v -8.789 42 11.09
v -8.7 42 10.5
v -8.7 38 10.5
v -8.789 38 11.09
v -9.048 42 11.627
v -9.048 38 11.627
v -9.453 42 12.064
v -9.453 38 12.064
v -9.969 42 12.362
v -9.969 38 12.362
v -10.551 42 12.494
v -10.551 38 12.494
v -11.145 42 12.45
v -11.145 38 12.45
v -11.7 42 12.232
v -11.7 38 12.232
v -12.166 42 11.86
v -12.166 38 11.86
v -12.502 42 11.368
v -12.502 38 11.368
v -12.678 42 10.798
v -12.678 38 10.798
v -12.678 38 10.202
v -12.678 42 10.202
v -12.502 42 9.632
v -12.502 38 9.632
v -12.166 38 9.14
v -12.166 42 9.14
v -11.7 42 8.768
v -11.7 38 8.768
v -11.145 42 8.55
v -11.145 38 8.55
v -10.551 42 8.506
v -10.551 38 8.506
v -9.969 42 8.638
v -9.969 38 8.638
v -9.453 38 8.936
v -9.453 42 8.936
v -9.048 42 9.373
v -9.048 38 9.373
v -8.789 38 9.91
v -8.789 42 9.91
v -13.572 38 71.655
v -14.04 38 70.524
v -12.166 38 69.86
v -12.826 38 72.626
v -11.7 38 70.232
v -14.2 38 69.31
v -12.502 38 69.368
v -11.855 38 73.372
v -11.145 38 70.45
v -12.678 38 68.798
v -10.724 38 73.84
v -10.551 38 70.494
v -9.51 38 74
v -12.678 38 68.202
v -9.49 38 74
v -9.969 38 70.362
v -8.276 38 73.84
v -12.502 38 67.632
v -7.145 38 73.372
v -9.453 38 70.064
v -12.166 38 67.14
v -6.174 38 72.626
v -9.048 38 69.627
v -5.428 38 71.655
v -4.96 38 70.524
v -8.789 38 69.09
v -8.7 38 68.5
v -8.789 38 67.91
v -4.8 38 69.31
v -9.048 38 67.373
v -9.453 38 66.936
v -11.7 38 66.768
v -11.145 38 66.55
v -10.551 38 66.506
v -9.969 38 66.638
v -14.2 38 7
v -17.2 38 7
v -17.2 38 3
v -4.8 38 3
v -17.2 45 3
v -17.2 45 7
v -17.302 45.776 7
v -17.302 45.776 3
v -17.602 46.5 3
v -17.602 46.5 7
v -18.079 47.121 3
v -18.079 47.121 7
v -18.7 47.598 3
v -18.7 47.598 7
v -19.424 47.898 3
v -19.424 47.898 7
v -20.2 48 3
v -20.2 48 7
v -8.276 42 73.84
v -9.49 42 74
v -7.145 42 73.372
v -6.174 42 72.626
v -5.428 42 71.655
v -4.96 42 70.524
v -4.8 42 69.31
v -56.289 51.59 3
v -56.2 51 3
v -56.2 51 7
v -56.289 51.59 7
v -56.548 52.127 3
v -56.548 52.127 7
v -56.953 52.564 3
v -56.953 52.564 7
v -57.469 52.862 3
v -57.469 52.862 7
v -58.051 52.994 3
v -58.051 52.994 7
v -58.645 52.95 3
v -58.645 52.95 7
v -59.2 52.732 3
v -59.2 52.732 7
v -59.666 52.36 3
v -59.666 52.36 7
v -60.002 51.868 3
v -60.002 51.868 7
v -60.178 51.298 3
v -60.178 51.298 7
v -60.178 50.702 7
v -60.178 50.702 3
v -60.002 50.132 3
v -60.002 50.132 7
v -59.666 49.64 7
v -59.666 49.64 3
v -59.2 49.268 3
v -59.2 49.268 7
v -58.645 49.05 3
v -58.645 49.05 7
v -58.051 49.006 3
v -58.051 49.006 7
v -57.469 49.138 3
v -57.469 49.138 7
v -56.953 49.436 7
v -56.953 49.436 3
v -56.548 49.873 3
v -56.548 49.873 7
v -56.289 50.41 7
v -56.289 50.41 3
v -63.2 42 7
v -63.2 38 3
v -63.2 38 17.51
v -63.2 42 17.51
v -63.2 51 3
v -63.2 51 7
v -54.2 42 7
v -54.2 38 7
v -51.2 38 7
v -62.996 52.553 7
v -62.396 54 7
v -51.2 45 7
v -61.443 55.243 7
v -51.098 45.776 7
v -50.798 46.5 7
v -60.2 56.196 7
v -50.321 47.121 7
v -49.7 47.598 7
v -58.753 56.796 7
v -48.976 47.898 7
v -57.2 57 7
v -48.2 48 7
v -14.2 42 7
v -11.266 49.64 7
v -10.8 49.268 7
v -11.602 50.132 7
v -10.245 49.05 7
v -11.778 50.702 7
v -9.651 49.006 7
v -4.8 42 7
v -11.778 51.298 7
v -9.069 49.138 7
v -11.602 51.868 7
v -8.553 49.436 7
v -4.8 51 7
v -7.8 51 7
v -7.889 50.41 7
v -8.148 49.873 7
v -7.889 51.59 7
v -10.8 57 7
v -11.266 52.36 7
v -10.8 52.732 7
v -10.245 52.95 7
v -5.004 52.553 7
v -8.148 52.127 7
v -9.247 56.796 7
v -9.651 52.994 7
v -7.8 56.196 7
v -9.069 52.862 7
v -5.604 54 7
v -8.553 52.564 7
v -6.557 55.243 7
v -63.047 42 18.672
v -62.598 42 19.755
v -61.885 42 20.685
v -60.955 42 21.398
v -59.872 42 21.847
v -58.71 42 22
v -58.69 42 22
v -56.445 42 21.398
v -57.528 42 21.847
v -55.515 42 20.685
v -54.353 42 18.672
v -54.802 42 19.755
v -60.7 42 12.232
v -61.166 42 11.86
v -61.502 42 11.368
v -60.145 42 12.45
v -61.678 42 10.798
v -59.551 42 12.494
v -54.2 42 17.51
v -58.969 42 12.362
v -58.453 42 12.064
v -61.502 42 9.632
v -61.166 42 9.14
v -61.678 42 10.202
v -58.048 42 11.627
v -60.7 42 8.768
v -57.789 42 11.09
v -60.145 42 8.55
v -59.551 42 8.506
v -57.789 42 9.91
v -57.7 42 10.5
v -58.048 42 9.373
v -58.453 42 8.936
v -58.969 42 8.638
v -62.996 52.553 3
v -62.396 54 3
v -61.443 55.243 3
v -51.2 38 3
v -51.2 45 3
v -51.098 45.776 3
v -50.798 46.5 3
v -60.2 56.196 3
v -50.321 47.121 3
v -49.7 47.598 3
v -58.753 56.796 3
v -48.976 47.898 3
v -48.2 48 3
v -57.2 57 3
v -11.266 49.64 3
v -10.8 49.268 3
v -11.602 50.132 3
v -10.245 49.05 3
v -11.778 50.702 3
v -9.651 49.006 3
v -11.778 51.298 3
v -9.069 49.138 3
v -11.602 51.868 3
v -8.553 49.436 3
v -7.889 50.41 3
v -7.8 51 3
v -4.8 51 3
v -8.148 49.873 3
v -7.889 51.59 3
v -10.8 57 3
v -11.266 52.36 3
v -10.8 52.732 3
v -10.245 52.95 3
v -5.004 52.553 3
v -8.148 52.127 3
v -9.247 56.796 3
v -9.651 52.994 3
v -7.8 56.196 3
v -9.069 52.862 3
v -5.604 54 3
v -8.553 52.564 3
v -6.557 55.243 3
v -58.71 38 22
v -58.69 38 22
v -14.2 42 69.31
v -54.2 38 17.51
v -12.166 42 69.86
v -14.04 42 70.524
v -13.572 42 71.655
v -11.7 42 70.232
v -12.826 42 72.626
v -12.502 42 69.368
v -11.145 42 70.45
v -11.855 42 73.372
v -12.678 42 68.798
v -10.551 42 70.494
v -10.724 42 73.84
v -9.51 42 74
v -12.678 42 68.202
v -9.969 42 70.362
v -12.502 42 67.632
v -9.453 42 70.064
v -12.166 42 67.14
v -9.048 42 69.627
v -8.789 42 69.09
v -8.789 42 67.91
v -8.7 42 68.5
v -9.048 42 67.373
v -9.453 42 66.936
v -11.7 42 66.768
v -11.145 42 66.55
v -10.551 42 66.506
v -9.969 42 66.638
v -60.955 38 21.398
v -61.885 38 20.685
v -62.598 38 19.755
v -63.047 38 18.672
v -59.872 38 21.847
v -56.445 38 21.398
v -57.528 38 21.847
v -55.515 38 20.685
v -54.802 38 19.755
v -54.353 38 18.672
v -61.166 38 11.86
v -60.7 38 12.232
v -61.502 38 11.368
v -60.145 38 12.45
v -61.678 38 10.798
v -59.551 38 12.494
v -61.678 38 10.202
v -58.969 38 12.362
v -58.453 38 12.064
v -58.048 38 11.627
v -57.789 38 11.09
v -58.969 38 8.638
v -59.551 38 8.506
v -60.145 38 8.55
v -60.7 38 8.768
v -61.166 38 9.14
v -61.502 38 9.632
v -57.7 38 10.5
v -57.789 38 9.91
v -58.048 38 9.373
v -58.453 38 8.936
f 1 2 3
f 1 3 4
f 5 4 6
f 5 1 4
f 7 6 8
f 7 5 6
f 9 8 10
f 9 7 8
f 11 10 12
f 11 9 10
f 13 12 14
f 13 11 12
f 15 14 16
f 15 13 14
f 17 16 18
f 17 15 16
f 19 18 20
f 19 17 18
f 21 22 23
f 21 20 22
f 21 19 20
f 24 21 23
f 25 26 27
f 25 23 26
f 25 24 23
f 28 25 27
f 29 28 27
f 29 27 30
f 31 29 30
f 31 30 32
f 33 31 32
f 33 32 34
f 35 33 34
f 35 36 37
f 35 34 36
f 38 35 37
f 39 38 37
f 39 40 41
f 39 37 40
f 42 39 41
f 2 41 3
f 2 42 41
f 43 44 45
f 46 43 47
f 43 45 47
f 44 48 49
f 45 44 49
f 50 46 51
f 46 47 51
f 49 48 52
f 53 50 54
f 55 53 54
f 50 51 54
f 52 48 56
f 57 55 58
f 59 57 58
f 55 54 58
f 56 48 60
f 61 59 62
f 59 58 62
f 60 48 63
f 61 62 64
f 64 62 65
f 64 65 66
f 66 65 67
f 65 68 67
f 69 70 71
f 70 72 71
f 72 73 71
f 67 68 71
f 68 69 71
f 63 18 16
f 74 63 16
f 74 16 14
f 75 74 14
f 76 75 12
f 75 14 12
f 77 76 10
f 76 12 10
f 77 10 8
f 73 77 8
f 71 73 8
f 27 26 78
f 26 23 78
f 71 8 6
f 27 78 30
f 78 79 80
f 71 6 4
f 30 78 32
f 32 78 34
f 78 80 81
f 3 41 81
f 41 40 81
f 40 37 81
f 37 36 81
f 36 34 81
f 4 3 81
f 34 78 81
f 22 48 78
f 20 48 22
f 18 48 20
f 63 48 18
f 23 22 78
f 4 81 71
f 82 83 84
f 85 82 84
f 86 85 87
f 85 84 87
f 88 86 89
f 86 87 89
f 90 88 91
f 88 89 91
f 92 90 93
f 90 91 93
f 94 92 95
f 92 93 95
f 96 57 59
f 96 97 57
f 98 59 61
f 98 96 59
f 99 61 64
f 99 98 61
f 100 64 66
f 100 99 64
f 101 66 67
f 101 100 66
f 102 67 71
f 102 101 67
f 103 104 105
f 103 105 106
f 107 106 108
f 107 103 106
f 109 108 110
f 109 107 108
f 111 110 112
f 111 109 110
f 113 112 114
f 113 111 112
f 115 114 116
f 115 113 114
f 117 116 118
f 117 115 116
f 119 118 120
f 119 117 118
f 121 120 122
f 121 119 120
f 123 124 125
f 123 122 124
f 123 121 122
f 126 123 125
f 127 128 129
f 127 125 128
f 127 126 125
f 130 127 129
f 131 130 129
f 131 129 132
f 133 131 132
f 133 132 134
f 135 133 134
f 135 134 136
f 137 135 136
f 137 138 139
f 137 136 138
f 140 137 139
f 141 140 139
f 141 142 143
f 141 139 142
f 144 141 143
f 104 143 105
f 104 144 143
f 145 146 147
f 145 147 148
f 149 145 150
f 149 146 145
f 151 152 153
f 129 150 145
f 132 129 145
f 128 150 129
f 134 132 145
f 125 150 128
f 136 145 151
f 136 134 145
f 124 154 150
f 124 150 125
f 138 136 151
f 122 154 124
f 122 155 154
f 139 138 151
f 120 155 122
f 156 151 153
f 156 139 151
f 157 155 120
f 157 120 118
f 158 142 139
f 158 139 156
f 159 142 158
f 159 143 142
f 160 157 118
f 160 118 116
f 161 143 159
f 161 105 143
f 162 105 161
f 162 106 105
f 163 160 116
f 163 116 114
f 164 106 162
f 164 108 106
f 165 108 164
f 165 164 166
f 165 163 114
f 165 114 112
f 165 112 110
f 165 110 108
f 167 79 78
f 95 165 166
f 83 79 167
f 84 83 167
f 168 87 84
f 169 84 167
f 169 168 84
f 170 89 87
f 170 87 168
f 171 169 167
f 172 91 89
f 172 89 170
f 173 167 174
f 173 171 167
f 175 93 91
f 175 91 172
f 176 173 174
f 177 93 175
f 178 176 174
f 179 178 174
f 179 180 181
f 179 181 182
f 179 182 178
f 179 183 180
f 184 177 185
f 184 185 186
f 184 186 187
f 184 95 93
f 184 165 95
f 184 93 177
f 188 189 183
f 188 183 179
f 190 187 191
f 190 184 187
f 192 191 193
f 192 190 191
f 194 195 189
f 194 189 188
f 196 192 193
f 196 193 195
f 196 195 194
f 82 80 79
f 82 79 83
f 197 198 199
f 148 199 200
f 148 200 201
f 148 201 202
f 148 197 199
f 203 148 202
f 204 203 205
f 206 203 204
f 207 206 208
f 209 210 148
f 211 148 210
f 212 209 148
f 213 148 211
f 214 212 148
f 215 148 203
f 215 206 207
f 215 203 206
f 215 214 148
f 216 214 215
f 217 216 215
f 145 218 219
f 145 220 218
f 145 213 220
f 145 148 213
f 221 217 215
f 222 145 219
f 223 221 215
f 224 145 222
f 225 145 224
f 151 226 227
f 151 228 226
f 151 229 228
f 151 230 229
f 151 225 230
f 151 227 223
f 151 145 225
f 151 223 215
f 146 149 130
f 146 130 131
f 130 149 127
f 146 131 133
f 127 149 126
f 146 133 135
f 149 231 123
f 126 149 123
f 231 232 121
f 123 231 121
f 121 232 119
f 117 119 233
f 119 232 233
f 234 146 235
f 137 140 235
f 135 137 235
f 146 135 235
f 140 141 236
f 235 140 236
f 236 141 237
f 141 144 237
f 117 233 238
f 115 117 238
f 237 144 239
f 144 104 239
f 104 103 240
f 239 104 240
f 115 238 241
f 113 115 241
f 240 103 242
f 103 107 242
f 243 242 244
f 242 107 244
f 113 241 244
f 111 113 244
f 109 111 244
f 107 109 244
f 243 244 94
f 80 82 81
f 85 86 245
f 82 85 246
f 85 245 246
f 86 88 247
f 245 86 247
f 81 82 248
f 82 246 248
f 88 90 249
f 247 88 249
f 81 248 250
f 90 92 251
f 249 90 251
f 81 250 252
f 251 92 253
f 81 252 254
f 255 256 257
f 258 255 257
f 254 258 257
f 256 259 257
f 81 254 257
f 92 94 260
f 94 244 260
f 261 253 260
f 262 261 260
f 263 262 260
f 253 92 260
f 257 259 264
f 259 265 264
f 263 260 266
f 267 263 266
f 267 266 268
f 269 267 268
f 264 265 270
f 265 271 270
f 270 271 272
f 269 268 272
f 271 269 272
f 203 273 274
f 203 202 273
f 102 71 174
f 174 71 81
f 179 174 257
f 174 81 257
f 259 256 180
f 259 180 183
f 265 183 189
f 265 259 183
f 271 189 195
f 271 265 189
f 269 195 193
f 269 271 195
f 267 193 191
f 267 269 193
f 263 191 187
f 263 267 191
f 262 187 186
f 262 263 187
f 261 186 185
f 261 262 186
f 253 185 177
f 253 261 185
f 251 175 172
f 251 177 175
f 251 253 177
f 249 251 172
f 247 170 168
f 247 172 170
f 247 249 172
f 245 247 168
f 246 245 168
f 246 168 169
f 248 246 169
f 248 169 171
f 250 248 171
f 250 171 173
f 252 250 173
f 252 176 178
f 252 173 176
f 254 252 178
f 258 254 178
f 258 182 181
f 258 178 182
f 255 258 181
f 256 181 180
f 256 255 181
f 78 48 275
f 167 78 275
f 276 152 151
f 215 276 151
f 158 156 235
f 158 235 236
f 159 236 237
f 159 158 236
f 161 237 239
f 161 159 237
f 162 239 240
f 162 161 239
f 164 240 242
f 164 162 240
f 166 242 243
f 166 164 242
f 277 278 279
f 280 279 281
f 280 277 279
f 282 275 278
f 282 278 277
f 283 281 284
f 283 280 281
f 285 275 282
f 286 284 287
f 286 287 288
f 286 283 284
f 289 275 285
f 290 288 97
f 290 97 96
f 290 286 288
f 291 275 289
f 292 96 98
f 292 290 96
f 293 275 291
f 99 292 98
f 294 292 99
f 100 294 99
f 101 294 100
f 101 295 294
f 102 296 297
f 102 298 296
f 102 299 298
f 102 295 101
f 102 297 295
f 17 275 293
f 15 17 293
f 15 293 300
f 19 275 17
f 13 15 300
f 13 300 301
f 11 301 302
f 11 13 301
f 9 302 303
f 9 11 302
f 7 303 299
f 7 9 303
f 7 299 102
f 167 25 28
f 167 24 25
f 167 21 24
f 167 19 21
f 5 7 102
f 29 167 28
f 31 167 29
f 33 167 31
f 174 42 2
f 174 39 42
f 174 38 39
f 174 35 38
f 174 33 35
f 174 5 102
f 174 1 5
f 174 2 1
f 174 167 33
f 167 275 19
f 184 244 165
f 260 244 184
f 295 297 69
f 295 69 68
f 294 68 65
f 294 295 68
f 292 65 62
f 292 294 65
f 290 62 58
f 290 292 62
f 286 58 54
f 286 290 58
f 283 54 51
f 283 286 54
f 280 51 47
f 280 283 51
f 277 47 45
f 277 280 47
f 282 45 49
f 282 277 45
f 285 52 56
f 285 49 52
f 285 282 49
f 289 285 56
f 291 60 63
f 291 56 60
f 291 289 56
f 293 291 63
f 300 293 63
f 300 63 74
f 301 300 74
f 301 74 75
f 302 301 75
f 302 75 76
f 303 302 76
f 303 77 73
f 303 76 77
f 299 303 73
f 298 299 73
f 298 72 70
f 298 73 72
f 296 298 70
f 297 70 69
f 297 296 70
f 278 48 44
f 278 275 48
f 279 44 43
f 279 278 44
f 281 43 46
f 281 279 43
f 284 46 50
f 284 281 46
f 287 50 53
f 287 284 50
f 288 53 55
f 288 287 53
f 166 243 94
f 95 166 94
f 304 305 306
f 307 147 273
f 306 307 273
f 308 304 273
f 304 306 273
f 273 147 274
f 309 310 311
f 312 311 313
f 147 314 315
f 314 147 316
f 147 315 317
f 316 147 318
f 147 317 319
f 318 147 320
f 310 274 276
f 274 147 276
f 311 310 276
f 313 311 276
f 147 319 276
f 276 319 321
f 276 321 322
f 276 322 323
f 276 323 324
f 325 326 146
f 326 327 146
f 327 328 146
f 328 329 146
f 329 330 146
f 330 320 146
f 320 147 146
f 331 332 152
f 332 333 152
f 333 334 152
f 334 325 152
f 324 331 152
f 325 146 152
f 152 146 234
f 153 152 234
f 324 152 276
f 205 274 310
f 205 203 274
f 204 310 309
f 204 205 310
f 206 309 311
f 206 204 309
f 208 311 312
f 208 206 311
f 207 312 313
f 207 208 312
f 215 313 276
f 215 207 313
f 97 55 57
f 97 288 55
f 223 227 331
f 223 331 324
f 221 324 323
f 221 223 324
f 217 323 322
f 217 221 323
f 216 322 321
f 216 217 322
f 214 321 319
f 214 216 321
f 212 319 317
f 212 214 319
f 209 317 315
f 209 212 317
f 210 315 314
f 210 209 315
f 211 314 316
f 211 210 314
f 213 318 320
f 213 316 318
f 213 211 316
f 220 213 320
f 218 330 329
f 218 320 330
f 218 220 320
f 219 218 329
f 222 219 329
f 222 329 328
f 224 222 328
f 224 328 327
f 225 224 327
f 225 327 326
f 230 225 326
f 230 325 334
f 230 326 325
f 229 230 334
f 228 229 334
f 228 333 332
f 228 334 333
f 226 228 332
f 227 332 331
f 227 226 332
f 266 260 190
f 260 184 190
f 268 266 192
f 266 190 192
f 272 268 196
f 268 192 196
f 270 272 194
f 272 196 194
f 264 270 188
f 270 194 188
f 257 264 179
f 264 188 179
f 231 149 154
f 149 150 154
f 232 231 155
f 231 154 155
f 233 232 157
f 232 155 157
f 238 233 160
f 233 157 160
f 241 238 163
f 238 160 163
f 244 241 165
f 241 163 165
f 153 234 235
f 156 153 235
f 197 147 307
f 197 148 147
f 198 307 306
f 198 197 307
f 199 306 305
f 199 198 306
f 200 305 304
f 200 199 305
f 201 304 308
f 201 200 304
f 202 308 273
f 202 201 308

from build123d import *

# Parameters (mm, degrees)
CYLINDER393_R     = 2
CYLINDER393_DEPTH = 16
CYLINDER395_R     = 2
CYLINDER395_DEPTH = 16
CYLINDER394_R     = 2
CYLINDER394_DEPTH = 16
BOX490_W          = 34
BOX490_H          = 10
BOX490_DEPTH      = 7
FILLET028_R       = 3
BOX489_W          = 58.4
BOX489_H          = 19
BOX489_DEPTH      = 4
FILLET029_R       = 6
CYLINDER384_R     = 2
CYLINDER384_DEPTH = 10
CYLINDER385_R     = 2
CYLINDER385_DEPTH = 10
BOX482_W          = 9.4
BOX482_H          = 4
BOX482_DEPTH      = 67
FILLET025_R       = 4.69
CYLINDER386_R     = 2
CYLINDER386_DEPTH = 10
BOX480_W          = 9
BOX480_H          = 4
BOX480_DEPTH      = 15
FILLET024_R       = 4.49


with BuildPart() as cylinder393:
    # Cylinder393 → Cylinder393 (new body)
    with BuildSketch(Plane(origin=(-9.8, 51, -5), x_dir=(1, 0, 0), z_dir=(0, 0, 1))):
        Circle(CYLINDER393_R)
    extrude(amount=CYLINDER393_DEPTH)


with BuildPart() as cylinder395:
    # Cylinder395 → Cylinder395 (new body)
    with BuildSketch(Plane(origin=(-58.2, 51, -5), x_dir=(1, 0, 0), z_dir=(0, 0, 1))):
        Circle(CYLINDER395_R)
    extrude(amount=CYLINDER395_DEPTH)


with BuildPart() as fusion386:
    # Cylinder394 → Cylinder394 (new body)
    with BuildSketch(Plane(origin=(-9.8, 51, -5), x_dir=(1, 0, 0), z_dir=(0, 0, 1))):
        Circle(CYLINDER394_R)
    extrude(amount=CYLINDER394_DEPTH)

    # Fusion386: union Cylinder393, Cylinder395
    add(cylinder393.part)
    add(cylinder395.part)


with BuildPart() as fillet028:
    # Box490 → Box490 (new body)
    with BuildSketch(Plane(origin=(-51.2, 38, 0), x_dir=(1, 0, 0), z_dir=(0, 0, 1))):
        with Locations((17, 5)):
            Rectangle(BOX490_W, BOX490_H)
    extrude(amount=BOX490_DEPTH)

    # Fillet028
    fillet028_edges = [fillet028.edges().sort_by_distance(p)[0] for p in [
        (-51.2, 48, 3.5),
        (-17.2, 48, 3.5),
    ]]
    fillet(fillet028_edges, radius=FILLET028_R)


with BuildPart() as fillet029:
    # Box489 → Box489 (new body)
    with BuildSketch(Plane(origin=(-63.2, 38, 3), x_dir=(1, 0, 0), z_dir=(0, 0, 1))):
        with Locations((29.2, 9.5)):
            Rectangle(BOX489_W, BOX489_H)
    extrude(amount=BOX489_DEPTH)

    # Cut421: cut Fillet028
    add(fillet028.part, mode=Mode.SUBTRACT)

    # Cut422: cut Fusion386
    add(fusion386.part, mode=Mode.SUBTRACT)

    # Fillet029
    fillet029_edges = [fillet029.edges().sort_by_distance(p)[0] for p in [
        (-63.2, 57, 5),
        (-4.8, 57, 5),
    ]]
    fillet(fillet029_edges, radius=FILLET029_R)


with BuildPart() as cylinder384:
    # Cylinder384 → Cylinder384 (new body)
    with BuildSketch(Plane(origin=(-10.7, 44, 10.5), x_dir=(1, 0, 0), z_dir=(0, -1, 0))):
        Circle(CYLINDER384_R)
    extrude(amount=CYLINDER384_DEPTH)


with BuildPart() as fusion379:
    # Cylinder385 → Cylinder385 (new body)
    with BuildSketch(Plane(origin=(-10.7, 44, 68.5), x_dir=(1, 0, 0), z_dir=(0, -1, 0))):
        Circle(CYLINDER385_R)
    extrude(amount=CYLINDER385_DEPTH)

    # Fusion379: union Cylinder384
    add(cylinder384.part)


with BuildPart() as fillet025:
    # Box482 → Box482 (new body)
    with BuildSketch(Plane(origin=(-14.2, 38, 7), x_dir=(1, 0, 0), z_dir=(0, 0, 1))):
        with Locations((4.7, 2)):
            Rectangle(BOX482_W, BOX482_H)
    extrude(amount=BOX482_DEPTH)

    # Cut417: cut Fusion379
    add(fusion379.part, mode=Mode.SUBTRACT)

    # Fillet025
    fillet025_edges = [fillet025.edges().sort_by_distance(p)[0] for p in [
        (-14.2, 40, 74),
        (-4.8, 40, 74),
    ]]
    fillet(fillet025_edges, radius=FILLET025_R)


with BuildPart() as cylinder386:
    # Cylinder386 → Cylinder386 (new body)
    with BuildSketch(Plane(origin=(-59.7, 44, 10.5), x_dir=(1, 0, 0), z_dir=(0, -1, 0))):
        Circle(CYLINDER386_R)
    extrude(amount=CYLINDER386_DEPTH)


with BuildPart() as fusion388:
    # Box480 → Box480 (new body)
    with BuildSketch(Plane(origin=(-63.2, 38, 7), x_dir=(1, 0, 0), z_dir=(0, 0, 1))):
        with Locations((4.5, 2)):
            Rectangle(BOX480_W, BOX480_H)
    extrude(amount=BOX480_DEPTH)

    # Cut418: cut Cylinder386
    add(cylinder386.part, mode=Mode.SUBTRACT)

    # Fillet024
    fillet024_edges = [fusion388.edges().sort_by_distance(p)[0] for p in [
        (-63.2, 40, 22),
        (-54.2, 40, 22),
    ]]
    fillet(fillet024_edges, radius=FILLET024_R)

    # Fusion388: union Fillet029, Fillet025
    add(fillet029.part)
    add(fillet025.part)


solid = fusion388.part
